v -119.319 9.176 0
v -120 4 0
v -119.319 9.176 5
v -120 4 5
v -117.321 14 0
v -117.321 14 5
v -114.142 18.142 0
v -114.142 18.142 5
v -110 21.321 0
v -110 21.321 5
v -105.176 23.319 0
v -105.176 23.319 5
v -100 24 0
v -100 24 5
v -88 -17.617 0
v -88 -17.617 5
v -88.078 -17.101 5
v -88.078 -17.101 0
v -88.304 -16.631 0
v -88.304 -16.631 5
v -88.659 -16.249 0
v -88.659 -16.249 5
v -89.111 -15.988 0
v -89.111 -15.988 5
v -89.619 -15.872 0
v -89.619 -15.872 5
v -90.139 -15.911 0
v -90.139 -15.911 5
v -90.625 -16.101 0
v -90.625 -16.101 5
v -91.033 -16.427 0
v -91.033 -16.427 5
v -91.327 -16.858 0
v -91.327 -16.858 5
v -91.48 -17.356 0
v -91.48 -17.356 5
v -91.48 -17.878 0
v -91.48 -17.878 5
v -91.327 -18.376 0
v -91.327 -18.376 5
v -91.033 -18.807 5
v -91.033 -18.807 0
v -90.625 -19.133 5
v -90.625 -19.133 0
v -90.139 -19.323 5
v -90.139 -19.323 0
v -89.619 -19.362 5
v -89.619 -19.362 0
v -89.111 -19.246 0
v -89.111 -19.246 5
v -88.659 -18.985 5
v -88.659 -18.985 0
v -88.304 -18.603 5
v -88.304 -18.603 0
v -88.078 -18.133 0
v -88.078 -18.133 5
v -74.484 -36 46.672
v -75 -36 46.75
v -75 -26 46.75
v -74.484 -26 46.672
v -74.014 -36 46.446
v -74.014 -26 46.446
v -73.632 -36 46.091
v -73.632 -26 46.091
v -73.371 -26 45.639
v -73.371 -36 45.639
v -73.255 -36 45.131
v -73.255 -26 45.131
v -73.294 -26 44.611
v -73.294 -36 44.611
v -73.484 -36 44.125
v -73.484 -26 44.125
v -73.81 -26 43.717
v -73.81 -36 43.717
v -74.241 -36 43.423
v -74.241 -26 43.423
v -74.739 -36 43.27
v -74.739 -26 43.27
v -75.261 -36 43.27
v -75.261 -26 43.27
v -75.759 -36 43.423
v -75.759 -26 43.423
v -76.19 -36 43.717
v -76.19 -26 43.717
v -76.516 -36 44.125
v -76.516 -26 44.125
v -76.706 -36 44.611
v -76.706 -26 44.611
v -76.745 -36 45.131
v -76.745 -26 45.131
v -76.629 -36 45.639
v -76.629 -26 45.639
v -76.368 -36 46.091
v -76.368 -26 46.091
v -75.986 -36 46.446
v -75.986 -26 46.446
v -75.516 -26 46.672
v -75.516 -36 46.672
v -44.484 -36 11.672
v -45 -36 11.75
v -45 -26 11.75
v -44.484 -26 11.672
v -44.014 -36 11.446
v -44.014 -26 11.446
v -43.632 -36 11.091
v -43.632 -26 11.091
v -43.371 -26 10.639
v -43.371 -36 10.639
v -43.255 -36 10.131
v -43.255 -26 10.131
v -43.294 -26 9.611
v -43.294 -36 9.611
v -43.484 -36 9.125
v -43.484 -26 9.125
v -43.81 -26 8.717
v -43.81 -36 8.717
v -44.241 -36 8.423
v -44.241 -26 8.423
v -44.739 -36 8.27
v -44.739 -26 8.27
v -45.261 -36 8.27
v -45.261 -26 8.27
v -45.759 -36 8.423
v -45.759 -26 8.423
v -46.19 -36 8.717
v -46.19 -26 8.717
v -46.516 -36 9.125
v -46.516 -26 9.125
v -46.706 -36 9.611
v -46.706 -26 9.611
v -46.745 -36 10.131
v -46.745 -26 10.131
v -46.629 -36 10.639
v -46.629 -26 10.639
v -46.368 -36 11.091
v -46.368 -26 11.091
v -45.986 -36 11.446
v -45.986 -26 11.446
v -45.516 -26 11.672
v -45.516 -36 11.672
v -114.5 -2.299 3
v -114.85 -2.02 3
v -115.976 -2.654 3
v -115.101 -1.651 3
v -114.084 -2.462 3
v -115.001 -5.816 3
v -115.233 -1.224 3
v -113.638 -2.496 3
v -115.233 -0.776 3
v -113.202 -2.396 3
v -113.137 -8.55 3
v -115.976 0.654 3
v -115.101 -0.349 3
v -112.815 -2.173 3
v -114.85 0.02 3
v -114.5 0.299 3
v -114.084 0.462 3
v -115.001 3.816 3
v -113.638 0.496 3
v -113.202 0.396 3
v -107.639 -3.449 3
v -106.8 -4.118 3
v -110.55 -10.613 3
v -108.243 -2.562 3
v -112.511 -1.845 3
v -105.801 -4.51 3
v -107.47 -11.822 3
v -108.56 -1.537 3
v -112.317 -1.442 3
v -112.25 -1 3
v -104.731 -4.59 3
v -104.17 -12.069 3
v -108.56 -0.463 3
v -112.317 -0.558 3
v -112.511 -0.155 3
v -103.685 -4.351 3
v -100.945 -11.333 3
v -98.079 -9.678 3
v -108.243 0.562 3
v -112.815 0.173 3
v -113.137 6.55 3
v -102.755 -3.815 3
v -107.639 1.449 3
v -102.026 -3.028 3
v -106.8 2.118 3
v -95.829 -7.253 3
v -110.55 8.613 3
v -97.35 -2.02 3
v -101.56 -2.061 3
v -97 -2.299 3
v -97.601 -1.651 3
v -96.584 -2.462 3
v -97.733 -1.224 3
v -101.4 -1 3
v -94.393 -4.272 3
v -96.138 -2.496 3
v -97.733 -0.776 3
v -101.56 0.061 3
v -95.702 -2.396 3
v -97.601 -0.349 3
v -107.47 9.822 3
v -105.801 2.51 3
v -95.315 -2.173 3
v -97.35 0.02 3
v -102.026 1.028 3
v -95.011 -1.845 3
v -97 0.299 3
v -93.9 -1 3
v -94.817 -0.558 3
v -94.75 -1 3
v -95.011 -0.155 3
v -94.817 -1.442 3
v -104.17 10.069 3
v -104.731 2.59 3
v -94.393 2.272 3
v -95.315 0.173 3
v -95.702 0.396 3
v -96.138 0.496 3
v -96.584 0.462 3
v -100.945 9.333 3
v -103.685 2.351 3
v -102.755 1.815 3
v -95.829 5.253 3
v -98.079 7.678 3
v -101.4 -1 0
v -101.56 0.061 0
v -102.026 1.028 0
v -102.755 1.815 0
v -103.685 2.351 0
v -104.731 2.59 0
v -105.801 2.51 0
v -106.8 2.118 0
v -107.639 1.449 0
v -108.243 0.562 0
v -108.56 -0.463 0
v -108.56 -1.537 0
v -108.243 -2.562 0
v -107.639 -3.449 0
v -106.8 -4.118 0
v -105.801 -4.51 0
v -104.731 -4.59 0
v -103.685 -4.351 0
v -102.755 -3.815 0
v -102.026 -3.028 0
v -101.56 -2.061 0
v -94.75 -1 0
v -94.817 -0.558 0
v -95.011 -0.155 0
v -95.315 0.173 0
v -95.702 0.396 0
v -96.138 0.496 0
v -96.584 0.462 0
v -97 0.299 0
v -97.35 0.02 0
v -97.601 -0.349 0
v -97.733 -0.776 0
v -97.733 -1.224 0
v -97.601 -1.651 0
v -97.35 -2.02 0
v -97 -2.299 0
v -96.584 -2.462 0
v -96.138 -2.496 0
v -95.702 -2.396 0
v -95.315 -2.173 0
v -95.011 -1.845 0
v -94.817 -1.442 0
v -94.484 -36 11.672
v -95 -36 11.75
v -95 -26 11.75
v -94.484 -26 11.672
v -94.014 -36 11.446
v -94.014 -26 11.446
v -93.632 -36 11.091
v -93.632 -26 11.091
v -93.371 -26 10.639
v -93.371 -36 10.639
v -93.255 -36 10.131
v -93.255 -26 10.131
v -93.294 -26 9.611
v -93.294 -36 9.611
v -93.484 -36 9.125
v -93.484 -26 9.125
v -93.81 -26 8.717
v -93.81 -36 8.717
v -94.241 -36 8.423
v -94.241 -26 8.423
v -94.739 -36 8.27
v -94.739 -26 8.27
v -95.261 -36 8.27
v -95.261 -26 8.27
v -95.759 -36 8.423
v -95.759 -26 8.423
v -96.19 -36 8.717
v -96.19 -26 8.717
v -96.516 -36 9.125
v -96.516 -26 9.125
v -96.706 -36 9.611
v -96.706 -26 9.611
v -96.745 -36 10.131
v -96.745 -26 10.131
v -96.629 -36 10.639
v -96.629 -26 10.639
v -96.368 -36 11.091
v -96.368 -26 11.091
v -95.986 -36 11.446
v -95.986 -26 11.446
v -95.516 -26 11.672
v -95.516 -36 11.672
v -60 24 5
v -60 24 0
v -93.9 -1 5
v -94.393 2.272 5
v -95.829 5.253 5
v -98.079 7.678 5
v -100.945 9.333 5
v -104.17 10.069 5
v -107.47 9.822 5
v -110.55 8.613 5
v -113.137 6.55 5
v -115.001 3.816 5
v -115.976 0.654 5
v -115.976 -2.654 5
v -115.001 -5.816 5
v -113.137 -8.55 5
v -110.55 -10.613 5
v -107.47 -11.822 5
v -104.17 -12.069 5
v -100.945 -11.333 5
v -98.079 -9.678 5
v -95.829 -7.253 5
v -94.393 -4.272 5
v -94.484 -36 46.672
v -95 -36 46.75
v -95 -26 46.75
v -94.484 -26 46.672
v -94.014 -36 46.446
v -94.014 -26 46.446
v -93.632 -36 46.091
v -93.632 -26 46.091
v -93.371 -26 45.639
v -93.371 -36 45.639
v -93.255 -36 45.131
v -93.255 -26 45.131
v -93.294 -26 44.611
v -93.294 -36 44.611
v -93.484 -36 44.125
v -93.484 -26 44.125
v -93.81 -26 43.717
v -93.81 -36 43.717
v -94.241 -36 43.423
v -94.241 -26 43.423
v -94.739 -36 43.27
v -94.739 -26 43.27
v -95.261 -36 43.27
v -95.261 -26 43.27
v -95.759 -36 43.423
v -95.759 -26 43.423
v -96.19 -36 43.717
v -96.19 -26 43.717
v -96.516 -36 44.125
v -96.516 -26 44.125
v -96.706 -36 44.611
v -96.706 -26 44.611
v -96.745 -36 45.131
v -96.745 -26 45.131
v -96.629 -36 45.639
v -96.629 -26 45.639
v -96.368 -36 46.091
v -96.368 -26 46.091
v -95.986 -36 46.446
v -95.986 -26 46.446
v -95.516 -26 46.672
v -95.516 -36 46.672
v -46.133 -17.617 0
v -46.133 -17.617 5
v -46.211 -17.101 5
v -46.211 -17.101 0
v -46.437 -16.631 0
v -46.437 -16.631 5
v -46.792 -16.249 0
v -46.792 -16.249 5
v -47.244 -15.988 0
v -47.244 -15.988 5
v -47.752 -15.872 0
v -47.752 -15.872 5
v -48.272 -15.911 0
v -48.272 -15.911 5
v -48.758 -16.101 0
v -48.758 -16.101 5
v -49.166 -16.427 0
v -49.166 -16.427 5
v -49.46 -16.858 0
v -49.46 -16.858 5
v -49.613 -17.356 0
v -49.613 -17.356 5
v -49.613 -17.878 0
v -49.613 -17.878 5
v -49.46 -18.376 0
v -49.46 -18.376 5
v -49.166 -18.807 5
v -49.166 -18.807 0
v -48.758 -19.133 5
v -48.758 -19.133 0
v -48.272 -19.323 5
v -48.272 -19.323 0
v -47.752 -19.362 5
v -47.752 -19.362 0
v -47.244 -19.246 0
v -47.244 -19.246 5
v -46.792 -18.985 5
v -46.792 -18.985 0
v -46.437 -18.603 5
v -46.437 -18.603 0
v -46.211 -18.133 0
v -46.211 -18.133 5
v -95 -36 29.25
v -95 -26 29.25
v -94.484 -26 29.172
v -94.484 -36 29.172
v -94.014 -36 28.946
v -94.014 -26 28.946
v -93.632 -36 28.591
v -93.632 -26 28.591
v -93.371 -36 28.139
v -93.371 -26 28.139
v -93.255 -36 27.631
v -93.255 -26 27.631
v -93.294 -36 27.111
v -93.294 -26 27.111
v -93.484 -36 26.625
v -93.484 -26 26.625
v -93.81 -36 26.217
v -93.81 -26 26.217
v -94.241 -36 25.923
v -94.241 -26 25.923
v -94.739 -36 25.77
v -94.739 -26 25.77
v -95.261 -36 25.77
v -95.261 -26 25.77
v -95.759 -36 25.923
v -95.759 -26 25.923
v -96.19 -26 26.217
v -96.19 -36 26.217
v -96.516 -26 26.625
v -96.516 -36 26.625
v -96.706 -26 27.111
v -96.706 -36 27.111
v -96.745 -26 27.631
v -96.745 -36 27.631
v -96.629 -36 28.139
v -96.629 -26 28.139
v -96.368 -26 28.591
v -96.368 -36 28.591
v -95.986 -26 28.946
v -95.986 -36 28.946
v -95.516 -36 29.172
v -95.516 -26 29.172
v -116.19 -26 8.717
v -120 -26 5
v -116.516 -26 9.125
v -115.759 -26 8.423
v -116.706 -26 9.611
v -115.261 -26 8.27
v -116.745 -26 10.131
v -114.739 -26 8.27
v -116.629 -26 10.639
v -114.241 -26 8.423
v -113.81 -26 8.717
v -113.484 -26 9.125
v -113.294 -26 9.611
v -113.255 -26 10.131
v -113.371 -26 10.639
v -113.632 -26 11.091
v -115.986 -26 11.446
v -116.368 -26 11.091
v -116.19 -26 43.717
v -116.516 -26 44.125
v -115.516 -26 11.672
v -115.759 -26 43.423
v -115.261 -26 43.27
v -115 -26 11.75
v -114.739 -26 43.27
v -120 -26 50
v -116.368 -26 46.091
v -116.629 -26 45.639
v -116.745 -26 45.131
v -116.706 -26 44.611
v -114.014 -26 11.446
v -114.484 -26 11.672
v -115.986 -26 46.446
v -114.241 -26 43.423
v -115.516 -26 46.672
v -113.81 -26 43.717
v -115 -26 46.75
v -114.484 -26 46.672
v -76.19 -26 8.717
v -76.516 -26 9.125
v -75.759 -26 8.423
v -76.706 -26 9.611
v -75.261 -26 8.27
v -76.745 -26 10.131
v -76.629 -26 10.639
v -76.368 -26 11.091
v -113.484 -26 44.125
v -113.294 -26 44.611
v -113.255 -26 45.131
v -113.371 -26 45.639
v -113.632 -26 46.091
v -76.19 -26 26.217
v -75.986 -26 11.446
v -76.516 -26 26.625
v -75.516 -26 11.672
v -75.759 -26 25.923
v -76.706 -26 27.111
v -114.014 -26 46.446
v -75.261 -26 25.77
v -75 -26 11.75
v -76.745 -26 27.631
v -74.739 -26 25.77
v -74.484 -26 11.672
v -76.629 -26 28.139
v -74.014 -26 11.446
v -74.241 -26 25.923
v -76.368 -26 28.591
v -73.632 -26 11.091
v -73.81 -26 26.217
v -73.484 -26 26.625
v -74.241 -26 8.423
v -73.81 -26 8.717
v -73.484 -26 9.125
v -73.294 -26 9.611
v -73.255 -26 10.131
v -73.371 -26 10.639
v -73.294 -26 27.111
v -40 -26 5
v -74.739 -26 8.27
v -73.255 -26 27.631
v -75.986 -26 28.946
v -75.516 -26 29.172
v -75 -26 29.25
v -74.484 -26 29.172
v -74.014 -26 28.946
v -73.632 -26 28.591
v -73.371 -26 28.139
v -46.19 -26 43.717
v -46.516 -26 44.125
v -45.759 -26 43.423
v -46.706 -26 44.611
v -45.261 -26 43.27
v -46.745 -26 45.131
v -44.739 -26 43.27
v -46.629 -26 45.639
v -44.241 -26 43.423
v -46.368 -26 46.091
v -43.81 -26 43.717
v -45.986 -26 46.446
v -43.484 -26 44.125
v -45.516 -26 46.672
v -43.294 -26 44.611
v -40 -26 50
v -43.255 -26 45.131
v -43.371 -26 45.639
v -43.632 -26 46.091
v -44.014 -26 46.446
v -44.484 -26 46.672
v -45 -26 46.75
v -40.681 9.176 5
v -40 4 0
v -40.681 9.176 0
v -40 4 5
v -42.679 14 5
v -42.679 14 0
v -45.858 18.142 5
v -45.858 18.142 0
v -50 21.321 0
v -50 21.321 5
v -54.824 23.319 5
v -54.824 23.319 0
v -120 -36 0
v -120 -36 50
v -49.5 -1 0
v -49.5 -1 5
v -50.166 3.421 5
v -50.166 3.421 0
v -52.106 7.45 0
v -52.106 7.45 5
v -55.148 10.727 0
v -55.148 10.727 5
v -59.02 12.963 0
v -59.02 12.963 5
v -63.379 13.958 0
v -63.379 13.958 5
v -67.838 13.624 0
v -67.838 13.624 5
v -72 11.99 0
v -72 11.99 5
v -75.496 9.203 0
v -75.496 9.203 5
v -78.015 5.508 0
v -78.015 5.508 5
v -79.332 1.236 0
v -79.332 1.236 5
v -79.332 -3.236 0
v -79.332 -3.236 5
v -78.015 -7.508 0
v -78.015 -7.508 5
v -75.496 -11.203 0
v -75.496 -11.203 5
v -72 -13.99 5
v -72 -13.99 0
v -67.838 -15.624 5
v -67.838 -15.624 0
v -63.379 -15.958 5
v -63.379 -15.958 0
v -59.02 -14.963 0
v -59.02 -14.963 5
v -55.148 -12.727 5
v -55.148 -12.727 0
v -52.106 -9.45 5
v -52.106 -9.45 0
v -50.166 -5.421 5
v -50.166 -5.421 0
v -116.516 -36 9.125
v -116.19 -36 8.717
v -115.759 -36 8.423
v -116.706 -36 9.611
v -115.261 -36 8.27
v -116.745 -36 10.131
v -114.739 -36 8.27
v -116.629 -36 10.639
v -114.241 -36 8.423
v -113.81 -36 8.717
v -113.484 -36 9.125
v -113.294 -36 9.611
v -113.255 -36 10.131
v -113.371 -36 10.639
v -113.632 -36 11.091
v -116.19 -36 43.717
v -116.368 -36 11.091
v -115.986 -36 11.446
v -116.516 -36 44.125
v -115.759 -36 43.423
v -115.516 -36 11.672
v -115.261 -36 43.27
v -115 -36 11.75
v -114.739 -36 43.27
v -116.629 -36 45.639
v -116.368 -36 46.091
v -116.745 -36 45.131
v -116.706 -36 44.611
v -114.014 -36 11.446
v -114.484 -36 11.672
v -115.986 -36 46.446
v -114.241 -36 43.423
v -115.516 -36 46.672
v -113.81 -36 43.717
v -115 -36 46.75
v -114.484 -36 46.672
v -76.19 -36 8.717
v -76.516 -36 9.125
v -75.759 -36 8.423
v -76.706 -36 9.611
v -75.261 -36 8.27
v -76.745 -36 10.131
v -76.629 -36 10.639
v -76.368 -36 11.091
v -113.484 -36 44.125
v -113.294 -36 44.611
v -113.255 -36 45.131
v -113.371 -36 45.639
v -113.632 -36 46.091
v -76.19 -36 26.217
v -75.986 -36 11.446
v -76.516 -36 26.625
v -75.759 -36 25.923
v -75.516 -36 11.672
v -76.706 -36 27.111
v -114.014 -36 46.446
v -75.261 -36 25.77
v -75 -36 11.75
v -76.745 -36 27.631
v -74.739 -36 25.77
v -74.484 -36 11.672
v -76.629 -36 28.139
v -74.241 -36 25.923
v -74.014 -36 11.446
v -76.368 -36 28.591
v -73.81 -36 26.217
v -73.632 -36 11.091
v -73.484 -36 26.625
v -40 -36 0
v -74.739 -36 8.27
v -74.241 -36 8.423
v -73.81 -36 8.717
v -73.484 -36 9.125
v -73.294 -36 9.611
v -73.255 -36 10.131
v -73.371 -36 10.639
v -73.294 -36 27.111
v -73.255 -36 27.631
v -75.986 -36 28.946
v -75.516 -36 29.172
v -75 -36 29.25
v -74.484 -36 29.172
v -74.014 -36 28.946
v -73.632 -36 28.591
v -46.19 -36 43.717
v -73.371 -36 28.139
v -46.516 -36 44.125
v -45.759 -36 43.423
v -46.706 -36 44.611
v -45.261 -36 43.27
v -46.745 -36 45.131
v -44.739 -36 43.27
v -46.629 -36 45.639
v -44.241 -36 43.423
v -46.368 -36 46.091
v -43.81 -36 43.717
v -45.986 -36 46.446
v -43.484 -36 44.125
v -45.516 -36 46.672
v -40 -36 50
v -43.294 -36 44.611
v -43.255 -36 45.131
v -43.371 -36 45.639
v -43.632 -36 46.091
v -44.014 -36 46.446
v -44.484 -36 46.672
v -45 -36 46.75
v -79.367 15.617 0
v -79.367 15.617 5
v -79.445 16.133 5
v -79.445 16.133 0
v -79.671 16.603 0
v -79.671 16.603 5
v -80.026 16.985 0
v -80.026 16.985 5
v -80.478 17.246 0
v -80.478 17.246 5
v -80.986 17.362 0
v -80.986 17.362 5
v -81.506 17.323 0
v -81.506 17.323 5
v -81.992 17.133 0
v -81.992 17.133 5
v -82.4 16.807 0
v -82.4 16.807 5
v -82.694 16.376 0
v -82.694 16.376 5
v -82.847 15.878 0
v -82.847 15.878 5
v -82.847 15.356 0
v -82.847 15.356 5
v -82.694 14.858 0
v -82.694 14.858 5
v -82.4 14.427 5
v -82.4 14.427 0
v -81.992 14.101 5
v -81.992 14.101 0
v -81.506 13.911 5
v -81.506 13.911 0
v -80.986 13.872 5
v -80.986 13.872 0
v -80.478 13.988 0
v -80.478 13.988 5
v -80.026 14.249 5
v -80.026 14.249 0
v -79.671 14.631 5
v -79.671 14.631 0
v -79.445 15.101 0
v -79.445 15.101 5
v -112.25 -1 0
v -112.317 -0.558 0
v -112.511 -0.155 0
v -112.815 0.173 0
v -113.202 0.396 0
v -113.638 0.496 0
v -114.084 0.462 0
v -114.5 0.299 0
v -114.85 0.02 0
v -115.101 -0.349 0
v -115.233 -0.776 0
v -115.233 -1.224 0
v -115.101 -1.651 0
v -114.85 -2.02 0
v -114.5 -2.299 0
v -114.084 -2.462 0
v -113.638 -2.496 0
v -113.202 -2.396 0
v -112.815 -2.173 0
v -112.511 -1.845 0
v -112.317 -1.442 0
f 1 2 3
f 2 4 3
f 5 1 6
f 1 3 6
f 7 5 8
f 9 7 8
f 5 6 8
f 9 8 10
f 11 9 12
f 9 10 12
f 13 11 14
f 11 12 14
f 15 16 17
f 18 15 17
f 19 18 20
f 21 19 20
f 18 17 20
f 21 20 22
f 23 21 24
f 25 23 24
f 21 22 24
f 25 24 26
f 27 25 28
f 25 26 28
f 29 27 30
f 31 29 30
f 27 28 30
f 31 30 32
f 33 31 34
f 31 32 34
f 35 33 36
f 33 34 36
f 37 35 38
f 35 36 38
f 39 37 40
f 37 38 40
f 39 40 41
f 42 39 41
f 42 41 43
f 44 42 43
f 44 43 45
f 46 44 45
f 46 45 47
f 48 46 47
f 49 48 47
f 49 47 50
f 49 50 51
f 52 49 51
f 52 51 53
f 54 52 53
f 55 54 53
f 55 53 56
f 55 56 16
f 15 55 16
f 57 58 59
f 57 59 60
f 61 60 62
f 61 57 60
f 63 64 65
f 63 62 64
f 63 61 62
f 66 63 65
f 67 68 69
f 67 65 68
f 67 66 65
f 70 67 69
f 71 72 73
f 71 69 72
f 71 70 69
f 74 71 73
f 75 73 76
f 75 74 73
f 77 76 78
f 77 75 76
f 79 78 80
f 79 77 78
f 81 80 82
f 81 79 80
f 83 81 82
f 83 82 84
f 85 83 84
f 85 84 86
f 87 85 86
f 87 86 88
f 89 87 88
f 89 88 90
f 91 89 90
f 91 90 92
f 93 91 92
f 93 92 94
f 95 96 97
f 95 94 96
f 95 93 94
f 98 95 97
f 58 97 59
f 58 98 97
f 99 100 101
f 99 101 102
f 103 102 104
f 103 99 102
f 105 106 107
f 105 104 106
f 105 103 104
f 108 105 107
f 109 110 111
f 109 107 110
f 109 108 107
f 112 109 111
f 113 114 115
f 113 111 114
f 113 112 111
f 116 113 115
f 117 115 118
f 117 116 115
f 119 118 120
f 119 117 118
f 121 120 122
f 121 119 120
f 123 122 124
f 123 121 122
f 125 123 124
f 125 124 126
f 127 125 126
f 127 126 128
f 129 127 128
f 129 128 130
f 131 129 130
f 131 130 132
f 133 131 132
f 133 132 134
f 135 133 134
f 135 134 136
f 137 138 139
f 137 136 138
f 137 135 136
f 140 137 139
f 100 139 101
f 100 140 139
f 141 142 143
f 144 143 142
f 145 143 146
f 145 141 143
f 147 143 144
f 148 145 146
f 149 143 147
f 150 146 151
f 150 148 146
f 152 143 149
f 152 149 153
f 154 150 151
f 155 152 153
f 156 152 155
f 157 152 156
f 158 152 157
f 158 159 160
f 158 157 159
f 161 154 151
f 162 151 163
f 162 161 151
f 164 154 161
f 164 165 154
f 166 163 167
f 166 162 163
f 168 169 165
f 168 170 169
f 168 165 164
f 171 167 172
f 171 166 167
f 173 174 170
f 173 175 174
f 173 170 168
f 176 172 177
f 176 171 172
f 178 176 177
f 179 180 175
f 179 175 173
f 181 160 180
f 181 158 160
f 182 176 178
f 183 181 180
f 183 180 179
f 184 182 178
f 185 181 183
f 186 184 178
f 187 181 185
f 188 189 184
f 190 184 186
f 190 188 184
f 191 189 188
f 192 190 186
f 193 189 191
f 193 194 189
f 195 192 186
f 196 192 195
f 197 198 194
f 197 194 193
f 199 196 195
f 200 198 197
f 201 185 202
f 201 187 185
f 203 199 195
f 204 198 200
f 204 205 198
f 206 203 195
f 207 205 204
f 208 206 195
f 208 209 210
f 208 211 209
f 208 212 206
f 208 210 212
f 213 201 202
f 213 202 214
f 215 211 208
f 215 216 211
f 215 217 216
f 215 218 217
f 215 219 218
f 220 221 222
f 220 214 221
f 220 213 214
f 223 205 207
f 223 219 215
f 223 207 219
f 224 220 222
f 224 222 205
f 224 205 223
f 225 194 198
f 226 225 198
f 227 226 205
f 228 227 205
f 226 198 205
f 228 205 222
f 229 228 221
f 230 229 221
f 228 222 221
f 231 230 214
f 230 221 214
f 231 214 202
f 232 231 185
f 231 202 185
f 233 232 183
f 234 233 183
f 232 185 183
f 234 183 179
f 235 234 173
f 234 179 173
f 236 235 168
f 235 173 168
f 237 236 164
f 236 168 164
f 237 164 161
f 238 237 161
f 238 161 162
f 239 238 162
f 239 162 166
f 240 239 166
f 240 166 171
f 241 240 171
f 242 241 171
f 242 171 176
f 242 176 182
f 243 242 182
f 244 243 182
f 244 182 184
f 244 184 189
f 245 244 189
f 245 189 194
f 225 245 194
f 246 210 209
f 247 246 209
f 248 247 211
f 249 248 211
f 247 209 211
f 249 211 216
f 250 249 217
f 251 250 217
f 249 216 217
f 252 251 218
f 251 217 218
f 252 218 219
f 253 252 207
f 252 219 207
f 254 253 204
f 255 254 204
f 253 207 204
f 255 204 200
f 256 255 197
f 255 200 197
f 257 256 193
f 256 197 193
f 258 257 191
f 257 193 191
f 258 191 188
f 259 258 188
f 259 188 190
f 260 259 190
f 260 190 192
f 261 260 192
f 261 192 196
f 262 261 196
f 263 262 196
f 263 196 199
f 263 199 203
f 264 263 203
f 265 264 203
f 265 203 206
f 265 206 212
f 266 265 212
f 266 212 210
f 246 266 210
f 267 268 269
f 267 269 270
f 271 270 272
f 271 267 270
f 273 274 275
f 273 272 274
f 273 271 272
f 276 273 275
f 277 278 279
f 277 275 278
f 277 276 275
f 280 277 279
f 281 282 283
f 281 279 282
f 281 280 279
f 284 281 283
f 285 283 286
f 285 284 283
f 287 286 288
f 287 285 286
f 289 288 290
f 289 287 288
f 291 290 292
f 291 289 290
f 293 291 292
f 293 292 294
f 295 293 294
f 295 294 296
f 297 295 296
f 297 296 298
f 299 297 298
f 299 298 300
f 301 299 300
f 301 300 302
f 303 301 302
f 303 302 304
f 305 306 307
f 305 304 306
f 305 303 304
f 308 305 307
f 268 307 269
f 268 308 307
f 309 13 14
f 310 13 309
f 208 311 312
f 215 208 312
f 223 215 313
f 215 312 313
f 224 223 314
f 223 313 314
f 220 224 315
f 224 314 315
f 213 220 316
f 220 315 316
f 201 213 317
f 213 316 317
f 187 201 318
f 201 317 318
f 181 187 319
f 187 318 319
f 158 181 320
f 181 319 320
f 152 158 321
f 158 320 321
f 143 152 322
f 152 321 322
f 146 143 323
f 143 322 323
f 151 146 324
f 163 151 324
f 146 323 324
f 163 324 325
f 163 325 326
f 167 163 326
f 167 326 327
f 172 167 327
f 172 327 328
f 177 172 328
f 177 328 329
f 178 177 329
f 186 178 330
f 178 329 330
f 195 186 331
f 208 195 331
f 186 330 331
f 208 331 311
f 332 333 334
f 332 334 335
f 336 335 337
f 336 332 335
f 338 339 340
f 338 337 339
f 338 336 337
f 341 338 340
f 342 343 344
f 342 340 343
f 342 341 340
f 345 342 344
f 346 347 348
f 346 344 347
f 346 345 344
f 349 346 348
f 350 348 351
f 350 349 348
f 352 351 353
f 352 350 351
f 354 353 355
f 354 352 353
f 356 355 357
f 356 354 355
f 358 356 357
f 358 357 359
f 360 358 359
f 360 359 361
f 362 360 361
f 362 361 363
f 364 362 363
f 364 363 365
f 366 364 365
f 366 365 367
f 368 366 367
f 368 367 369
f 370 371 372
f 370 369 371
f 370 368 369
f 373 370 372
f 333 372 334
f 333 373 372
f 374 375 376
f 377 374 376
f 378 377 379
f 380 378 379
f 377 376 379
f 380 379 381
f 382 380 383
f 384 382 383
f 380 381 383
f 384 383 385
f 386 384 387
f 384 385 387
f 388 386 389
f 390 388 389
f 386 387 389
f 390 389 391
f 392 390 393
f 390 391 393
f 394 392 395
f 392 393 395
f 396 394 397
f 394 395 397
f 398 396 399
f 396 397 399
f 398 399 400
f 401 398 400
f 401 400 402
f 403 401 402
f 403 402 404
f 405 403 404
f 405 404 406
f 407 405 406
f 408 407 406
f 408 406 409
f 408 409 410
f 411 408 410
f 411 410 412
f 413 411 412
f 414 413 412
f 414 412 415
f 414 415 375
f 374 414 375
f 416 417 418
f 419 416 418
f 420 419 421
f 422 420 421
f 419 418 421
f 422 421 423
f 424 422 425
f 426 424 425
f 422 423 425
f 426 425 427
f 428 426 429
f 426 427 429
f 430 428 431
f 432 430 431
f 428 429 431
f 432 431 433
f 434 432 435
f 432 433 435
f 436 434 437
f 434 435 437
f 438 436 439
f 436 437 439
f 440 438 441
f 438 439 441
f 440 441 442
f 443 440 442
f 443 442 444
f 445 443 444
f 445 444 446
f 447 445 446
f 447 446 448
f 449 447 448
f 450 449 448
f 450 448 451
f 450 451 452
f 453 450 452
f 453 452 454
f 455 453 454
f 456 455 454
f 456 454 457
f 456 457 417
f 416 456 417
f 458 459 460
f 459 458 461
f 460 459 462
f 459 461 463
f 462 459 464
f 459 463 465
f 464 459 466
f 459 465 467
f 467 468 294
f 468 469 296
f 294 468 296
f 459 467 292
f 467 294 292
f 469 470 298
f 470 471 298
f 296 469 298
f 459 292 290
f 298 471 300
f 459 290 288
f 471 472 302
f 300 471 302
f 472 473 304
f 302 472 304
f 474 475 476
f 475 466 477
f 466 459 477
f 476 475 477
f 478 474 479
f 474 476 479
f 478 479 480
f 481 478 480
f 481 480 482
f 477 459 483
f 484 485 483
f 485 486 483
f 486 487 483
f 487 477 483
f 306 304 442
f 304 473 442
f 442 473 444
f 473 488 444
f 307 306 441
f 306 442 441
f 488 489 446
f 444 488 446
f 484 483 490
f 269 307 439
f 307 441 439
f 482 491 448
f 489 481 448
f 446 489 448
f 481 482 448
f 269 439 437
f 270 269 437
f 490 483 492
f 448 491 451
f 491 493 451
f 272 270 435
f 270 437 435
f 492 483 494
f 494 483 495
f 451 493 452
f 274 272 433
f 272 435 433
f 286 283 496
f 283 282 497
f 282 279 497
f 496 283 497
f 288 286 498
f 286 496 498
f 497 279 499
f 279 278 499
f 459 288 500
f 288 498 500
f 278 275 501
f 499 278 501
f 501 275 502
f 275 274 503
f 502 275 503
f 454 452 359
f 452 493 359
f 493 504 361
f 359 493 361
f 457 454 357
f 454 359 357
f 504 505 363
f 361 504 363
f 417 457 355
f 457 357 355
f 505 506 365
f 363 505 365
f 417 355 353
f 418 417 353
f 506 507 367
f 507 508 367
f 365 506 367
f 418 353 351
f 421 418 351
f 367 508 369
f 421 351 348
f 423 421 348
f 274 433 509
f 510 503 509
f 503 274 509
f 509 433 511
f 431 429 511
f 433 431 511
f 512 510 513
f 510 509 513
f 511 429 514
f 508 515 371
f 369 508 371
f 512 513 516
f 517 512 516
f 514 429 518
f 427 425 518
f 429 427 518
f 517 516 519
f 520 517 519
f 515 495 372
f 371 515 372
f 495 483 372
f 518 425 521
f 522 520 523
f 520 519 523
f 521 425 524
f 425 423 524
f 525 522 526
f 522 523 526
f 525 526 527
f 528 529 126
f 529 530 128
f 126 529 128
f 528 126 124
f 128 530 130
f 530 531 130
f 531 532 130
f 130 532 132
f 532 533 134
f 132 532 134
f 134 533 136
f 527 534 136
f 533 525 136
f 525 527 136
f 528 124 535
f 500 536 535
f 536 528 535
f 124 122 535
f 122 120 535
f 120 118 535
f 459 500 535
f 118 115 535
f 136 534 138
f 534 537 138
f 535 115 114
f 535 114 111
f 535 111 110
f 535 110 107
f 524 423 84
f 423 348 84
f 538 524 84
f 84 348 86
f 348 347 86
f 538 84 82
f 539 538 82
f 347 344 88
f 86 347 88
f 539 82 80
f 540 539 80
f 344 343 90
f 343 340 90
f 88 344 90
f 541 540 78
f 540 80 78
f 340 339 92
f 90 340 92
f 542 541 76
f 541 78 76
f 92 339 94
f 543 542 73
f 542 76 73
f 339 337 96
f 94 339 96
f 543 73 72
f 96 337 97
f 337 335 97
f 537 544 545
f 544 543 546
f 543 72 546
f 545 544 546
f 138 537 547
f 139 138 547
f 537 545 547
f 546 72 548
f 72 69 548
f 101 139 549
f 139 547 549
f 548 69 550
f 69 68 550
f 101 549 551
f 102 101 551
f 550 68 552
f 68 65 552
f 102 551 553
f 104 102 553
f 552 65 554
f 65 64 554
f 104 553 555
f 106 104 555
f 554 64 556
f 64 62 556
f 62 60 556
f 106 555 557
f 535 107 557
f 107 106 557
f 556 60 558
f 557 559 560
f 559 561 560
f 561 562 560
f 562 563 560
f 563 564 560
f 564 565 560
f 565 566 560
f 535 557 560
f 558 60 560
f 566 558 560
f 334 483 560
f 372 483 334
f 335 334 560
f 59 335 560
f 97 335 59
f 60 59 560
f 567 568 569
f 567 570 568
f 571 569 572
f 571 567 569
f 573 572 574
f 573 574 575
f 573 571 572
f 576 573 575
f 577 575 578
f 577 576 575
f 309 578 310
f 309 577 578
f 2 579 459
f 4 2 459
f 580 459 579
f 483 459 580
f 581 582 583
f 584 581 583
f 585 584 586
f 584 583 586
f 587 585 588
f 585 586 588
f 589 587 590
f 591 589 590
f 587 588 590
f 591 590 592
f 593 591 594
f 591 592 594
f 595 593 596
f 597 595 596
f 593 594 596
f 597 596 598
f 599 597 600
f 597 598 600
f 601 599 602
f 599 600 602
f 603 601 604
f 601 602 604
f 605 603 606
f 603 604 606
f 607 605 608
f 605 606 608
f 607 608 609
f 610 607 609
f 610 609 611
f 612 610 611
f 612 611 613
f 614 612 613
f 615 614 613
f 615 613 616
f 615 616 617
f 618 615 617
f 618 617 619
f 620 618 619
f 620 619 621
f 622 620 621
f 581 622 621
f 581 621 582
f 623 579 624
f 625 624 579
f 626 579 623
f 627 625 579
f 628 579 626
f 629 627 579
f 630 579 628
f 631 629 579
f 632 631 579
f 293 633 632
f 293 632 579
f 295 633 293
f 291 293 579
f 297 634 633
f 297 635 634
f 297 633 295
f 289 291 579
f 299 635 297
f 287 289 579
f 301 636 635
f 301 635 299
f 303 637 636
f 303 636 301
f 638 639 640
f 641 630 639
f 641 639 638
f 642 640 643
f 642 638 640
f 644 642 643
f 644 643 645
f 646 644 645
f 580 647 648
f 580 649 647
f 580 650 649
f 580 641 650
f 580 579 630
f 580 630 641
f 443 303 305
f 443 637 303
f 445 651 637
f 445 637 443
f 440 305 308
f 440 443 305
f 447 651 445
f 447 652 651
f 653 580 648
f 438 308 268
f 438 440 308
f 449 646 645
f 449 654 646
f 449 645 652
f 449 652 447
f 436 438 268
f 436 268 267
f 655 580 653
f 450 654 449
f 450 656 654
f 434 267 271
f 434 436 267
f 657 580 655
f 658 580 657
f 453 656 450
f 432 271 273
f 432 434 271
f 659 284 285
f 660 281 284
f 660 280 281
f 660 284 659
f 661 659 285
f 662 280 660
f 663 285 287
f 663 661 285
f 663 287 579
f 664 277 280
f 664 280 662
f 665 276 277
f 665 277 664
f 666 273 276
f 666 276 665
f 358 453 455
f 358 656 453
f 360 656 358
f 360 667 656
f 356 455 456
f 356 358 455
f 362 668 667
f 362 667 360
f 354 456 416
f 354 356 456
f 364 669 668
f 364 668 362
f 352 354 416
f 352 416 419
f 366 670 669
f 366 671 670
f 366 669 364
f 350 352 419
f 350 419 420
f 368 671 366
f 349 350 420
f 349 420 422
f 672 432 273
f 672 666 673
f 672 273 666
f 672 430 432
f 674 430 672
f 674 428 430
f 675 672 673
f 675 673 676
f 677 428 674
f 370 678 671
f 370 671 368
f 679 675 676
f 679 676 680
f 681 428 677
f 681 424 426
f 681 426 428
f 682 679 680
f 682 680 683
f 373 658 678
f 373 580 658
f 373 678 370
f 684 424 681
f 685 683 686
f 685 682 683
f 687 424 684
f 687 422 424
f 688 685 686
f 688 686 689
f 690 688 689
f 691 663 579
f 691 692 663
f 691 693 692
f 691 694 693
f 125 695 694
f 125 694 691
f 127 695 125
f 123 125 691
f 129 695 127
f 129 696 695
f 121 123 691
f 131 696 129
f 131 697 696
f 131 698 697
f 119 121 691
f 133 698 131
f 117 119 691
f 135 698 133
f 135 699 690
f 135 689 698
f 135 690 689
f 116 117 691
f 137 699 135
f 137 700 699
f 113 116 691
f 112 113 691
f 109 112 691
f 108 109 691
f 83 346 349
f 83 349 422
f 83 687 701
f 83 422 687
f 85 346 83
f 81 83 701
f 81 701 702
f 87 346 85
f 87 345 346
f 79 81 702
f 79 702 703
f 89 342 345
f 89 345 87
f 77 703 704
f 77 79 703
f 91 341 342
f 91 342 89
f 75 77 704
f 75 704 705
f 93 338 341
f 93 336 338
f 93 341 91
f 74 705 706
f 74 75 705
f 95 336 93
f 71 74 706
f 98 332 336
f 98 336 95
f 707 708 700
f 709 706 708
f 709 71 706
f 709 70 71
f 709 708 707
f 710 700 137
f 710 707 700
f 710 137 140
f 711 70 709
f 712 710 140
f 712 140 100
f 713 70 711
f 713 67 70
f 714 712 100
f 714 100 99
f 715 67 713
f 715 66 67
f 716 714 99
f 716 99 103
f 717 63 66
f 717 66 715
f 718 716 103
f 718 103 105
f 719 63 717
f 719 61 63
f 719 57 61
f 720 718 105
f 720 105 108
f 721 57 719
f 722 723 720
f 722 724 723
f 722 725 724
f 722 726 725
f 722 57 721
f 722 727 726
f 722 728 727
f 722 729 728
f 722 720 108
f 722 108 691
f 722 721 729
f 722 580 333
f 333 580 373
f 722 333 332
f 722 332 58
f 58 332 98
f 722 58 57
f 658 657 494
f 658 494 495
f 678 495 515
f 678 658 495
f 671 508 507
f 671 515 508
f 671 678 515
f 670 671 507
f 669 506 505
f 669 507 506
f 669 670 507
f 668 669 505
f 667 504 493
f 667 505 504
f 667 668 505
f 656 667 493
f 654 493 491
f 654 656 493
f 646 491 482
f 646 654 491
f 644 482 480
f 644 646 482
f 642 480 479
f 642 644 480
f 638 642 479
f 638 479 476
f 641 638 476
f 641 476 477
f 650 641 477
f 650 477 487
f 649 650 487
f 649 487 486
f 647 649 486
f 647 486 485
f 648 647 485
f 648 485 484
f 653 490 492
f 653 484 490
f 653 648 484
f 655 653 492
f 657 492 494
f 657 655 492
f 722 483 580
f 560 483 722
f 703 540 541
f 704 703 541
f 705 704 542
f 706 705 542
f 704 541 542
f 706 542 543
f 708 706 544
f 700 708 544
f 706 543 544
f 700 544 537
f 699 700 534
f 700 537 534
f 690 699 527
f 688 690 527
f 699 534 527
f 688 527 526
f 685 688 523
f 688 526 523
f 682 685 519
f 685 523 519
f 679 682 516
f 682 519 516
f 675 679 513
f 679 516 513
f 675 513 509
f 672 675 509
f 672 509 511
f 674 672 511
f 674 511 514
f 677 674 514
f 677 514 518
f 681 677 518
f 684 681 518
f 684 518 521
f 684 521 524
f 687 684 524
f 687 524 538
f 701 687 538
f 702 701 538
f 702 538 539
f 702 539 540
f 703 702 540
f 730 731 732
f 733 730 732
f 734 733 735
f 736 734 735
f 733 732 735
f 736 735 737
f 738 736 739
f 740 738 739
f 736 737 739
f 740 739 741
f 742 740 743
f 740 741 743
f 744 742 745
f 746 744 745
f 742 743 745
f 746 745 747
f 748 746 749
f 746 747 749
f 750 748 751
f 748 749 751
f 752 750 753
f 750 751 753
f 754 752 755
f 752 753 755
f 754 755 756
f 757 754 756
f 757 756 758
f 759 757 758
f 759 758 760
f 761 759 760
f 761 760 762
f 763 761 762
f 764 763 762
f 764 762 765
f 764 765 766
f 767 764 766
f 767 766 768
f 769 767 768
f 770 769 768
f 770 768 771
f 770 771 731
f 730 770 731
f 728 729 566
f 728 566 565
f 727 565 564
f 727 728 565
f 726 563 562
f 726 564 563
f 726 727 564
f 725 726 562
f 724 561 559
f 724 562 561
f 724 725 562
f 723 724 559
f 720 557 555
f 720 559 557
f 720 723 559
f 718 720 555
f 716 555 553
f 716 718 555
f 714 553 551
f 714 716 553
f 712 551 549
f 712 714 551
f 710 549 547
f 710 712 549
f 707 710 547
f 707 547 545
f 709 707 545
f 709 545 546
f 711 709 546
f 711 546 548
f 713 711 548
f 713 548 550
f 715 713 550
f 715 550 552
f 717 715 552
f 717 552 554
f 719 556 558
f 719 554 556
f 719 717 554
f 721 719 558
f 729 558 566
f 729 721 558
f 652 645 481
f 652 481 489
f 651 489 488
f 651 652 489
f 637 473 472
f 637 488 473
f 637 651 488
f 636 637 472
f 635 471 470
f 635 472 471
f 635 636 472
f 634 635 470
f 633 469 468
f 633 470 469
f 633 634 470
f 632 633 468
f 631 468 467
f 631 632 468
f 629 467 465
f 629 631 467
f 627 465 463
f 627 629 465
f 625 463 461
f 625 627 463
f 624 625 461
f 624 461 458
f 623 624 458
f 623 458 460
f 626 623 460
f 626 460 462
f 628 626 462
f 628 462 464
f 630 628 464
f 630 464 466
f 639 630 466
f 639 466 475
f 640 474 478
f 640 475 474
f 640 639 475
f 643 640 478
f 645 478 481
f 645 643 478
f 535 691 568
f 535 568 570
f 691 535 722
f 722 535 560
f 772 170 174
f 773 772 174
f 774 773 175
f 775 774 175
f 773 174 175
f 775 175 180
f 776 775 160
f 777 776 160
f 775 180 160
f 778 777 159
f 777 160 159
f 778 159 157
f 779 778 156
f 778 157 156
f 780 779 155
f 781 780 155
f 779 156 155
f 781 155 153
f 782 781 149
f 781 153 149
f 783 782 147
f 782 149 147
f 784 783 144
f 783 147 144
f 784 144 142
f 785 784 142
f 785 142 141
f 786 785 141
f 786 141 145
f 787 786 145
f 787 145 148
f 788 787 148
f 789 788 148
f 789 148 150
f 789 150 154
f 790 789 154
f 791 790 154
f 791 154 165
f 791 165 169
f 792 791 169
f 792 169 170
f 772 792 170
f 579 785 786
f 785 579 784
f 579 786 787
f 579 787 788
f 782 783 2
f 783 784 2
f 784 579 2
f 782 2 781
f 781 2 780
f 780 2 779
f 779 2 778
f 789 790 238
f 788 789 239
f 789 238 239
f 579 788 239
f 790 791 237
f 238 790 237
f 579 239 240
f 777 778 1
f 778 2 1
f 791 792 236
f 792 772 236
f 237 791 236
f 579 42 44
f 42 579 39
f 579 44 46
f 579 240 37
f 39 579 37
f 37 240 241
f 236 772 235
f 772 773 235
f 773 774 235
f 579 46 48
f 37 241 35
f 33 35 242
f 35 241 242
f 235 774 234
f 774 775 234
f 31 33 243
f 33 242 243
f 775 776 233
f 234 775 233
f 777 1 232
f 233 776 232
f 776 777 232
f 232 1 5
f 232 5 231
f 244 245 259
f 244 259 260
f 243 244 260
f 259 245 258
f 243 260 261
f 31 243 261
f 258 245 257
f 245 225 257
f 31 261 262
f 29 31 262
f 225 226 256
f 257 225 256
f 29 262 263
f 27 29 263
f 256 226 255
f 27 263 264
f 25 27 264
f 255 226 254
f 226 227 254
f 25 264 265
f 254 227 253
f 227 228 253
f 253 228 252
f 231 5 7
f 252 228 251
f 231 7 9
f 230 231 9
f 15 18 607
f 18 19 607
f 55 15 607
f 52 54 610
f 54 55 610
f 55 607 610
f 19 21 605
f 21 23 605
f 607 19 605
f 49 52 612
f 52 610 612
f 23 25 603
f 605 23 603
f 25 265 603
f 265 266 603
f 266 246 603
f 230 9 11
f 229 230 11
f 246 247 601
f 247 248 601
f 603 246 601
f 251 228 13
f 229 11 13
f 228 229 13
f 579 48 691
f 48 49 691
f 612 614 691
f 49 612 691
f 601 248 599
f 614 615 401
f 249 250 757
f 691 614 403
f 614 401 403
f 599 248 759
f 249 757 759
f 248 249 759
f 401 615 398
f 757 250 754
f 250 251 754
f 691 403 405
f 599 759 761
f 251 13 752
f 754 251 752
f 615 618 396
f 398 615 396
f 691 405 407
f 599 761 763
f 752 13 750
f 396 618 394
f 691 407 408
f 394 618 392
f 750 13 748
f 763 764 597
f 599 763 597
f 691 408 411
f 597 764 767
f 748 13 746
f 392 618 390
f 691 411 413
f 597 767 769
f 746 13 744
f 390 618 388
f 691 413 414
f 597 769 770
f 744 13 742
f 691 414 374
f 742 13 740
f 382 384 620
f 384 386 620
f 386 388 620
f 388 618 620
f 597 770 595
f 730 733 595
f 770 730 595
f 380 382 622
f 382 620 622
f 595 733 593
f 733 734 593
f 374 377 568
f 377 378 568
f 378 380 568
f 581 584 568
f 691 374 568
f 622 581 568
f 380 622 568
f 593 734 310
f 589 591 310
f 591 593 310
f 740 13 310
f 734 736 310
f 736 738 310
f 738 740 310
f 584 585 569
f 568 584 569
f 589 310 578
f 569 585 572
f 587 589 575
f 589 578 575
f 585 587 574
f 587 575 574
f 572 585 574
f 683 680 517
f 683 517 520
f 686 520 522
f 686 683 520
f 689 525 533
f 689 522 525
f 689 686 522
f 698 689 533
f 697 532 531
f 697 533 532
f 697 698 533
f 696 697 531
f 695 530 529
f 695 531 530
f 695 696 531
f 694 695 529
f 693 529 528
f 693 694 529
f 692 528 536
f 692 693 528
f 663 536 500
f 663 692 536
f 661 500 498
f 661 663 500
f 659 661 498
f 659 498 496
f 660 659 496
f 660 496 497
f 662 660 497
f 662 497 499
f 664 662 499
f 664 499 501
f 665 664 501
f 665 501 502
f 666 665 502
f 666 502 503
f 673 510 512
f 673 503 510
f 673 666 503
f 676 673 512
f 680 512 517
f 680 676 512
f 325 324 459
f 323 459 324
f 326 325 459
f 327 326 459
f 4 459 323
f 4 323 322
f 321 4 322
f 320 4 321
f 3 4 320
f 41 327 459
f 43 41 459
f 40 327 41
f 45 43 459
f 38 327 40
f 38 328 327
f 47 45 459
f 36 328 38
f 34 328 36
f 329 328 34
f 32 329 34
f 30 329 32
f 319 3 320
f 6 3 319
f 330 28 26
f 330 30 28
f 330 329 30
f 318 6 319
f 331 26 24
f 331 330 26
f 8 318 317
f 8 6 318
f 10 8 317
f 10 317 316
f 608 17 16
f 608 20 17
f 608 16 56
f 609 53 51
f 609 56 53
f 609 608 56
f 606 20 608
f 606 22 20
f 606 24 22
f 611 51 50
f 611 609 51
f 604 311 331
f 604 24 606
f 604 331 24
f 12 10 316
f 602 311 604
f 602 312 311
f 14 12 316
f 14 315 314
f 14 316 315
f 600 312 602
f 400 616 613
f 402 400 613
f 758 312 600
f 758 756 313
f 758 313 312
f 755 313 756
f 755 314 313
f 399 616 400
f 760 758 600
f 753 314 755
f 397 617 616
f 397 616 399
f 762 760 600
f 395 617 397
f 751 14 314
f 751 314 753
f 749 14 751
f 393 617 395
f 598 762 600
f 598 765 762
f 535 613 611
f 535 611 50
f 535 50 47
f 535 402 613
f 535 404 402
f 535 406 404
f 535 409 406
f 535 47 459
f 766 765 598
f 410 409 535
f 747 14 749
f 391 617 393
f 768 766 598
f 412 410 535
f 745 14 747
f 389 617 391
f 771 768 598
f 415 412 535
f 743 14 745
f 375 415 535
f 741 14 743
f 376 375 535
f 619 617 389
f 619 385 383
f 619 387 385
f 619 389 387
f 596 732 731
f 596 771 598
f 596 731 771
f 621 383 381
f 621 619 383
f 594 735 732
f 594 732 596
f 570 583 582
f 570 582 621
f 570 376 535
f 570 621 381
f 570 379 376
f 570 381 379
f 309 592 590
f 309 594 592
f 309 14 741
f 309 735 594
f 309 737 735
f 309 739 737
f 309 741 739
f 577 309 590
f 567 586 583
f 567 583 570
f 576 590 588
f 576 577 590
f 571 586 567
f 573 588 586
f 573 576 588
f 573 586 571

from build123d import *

# Parameters (mm, degrees)
SKETCH1_W               = 80
SKETCH1_H               = 50
BOSS_EXTRUDE1_DEPTH     = 5
SKETCH2_R               = 3.6
CUT_EXTRUDE1_DEPTH      = 123.886126149
SKETCH3_R               = 1.5
CUT_EXTRUDE2_DEPTH      = 123.886126149
SKETCH4_R               = 11.1
CUT_EXTRUDE3_DEPTH      = 2
SKETCH5_R               = 15
CUT_EXTRUDE4_DEPTH      = 123.886126149
SKETCH6_R               = 1.75
CUT_EXTRUDE5_DEPTH      = 123.886126149
SKETCH7_W               = 80
SKETCH7_H               = 50
BOSS_EXTRUDE2_DEPTH     = 10
FILLET1_R               = 20
CUT_EXTRUDE6_DEPTH      = 140.283882772
CUT_EXTRUDE6_DEPTH_BACK = 140.283882772
SKETCH9_R               = 1.75
SKETCH10_R              = 1.75
CUT_EXTRUDE7_DEPTH      = 140.283882772
SKETCH11_R              = 1.75
CUT_EXTRUDE8_DEPTH      = 134.120246394


with BuildPart() as part:
    # Sketch1 → Boss-Extrude1 (new body)
    with BuildSketch(Plane.XY):
        with Locations((-80, -1)):
            Rectangle(SKETCH1_W, SKETCH1_H)
    extrude(amount=BOSS_EXTRUDE1_DEPTH)

    # Sketch2 → Cut-Extrude1 (cut, through all)
    with BuildSketch(Plane.XY.offset(5)):
        with Locations((-105, -1)):
            Circle(SKETCH2_R)
    extrude(amount=-CUT_EXTRUDE1_DEPTH, mode=Mode.SUBTRACT)

    # Sketch3 → Cut-Extrude2 (cut, through all)
    with BuildSketch(Plane.XY.offset(5)):
        with Locations((-96.25, -1)):
            Circle(SKETCH3_R)
        with Locations((-113.75, -1)):
            Circle(SKETCH3_R)
    extrude(amount=-CUT_EXTRUDE2_DEPTH, mode=Mode.SUBTRACT)

    # Sketch4 → Cut-Extrude3 (cut)
    with BuildSketch(Plane.XY.offset(5)):
        with Locations((-105, -1)):
            Circle(SKETCH4_R)
    extrude(amount=-CUT_EXTRUDE3_DEPTH, mode=Mode.SUBTRACT)

    # Sketch5 → Cut-Extrude4 (cut, through all)
    with BuildSketch(Plane.XY.offset(5)):
        with Locations((-64.5, -1)):
            Circle(SKETCH5_R)
    extrude(amount=-CUT_EXTRUDE4_DEPTH, mode=Mode.SUBTRACT)

    # Sketch6 → Cut-Extrude5 (cut, through all)
    with BuildSketch(Plane.XY.offset(5)):
        with Locations((-81.117009358, 15.617009358)):
            Circle(SKETCH6_R)
        with Locations((-47.882990642, -17.617009358)):
            Circle(SKETCH6_R)
    extrude(amount=-CUT_EXTRUDE5_DEPTH, mode=Mode.SUBTRACT)

    # Sketch7 → Boss-Extrude2 (add)
    with BuildSketch(Plane.XZ.offset(26)):
        with Locations((-80, 25)):
            Rectangle(SKETCH7_W, SKETCH7_H)
    extrude(amount=BOSS_EXTRUDE2_DEPTH)

    # Fillet1
    fillet1_edges = [part.edges().sort_by_distance(p)[0] for p in [
        (-120, 24, 2.5),
        (-40, 24, 2.5),
    ]]
    fillet(fillet1_edges, radius=FILLET1_R)

    # Sketch9 → Cut-Extrude6 (cut, two sides: drawn at the far end of the back side and taken through both)
    with BuildSketch(Plane(origin=(0, -26, 0), x_dir=(1, 0, 0), z_dir=(0, 1, 0)).offset(-CUT_EXTRUDE6_DEPTH_BACK)):
        with Locations(Location((-115, -10, 0), (0, 0, 270))):
            Circle(SKETCH9_R)
        with Locations(Location((-45, -10, 0), (0, 0, 270))):
            Circle(SKETCH9_R)
        with Locations(Location((-45, -45, 0), (0, 0, 270))):
            Circle(SKETCH9_R)
        with Locations(Location((-115, -45, 0), (0, 0, 270))):
            Circle(SKETCH9_R)
        with Locations(Location((-95, -10, 0), (0, 0, 270))):
            Circle(SKETCH9_R)
        with Locations(Location((-95, -45, 0), (0, 0, 270))):
            Circle(SKETCH9_R)
        with Locations(Location((-75, -10, 0), (0, 0, 270))):
            Circle(SKETCH9_R)
        with Locations(Location((-75, -45, 0), (0, 0, 270))):
            Circle(SKETCH9_R)
    extrude(amount=CUT_EXTRUDE6_DEPTH + CUT_EXTRUDE6_DEPTH_BACK, mode=Mode.SUBTRACT)

    # Sketch10 → Cut-Extrude7 (cut, through all)
    with BuildSketch(Plane(origin=(0, -26, 0), x_dir=(1, 0, 0), z_dir=(0, 1, 0))):
        with Locations(Location((-95, -27.5, 0), (0, 0, 270))):
            Circle(SKETCH10_R)
        with Locations(Location((-75, -27.5, 0), (0, 0, 270))):
            Circle(SKETCH10_R)
    extrude(amount=-CUT_EXTRUDE7_DEPTH, mode=Mode.SUBTRACT)

    # Sketch11 → Cut-Extrude8 (cut, through all)
    with BuildSketch(Plane.XY.offset(5)):
        with Locations((-89.75, -17.617009358)):
            Circle(SKETCH11_R)
    extrude(amount=-CUT_EXTRUDE8_DEPTH, mode=Mode.SUBTRACT)


solid = part.part
